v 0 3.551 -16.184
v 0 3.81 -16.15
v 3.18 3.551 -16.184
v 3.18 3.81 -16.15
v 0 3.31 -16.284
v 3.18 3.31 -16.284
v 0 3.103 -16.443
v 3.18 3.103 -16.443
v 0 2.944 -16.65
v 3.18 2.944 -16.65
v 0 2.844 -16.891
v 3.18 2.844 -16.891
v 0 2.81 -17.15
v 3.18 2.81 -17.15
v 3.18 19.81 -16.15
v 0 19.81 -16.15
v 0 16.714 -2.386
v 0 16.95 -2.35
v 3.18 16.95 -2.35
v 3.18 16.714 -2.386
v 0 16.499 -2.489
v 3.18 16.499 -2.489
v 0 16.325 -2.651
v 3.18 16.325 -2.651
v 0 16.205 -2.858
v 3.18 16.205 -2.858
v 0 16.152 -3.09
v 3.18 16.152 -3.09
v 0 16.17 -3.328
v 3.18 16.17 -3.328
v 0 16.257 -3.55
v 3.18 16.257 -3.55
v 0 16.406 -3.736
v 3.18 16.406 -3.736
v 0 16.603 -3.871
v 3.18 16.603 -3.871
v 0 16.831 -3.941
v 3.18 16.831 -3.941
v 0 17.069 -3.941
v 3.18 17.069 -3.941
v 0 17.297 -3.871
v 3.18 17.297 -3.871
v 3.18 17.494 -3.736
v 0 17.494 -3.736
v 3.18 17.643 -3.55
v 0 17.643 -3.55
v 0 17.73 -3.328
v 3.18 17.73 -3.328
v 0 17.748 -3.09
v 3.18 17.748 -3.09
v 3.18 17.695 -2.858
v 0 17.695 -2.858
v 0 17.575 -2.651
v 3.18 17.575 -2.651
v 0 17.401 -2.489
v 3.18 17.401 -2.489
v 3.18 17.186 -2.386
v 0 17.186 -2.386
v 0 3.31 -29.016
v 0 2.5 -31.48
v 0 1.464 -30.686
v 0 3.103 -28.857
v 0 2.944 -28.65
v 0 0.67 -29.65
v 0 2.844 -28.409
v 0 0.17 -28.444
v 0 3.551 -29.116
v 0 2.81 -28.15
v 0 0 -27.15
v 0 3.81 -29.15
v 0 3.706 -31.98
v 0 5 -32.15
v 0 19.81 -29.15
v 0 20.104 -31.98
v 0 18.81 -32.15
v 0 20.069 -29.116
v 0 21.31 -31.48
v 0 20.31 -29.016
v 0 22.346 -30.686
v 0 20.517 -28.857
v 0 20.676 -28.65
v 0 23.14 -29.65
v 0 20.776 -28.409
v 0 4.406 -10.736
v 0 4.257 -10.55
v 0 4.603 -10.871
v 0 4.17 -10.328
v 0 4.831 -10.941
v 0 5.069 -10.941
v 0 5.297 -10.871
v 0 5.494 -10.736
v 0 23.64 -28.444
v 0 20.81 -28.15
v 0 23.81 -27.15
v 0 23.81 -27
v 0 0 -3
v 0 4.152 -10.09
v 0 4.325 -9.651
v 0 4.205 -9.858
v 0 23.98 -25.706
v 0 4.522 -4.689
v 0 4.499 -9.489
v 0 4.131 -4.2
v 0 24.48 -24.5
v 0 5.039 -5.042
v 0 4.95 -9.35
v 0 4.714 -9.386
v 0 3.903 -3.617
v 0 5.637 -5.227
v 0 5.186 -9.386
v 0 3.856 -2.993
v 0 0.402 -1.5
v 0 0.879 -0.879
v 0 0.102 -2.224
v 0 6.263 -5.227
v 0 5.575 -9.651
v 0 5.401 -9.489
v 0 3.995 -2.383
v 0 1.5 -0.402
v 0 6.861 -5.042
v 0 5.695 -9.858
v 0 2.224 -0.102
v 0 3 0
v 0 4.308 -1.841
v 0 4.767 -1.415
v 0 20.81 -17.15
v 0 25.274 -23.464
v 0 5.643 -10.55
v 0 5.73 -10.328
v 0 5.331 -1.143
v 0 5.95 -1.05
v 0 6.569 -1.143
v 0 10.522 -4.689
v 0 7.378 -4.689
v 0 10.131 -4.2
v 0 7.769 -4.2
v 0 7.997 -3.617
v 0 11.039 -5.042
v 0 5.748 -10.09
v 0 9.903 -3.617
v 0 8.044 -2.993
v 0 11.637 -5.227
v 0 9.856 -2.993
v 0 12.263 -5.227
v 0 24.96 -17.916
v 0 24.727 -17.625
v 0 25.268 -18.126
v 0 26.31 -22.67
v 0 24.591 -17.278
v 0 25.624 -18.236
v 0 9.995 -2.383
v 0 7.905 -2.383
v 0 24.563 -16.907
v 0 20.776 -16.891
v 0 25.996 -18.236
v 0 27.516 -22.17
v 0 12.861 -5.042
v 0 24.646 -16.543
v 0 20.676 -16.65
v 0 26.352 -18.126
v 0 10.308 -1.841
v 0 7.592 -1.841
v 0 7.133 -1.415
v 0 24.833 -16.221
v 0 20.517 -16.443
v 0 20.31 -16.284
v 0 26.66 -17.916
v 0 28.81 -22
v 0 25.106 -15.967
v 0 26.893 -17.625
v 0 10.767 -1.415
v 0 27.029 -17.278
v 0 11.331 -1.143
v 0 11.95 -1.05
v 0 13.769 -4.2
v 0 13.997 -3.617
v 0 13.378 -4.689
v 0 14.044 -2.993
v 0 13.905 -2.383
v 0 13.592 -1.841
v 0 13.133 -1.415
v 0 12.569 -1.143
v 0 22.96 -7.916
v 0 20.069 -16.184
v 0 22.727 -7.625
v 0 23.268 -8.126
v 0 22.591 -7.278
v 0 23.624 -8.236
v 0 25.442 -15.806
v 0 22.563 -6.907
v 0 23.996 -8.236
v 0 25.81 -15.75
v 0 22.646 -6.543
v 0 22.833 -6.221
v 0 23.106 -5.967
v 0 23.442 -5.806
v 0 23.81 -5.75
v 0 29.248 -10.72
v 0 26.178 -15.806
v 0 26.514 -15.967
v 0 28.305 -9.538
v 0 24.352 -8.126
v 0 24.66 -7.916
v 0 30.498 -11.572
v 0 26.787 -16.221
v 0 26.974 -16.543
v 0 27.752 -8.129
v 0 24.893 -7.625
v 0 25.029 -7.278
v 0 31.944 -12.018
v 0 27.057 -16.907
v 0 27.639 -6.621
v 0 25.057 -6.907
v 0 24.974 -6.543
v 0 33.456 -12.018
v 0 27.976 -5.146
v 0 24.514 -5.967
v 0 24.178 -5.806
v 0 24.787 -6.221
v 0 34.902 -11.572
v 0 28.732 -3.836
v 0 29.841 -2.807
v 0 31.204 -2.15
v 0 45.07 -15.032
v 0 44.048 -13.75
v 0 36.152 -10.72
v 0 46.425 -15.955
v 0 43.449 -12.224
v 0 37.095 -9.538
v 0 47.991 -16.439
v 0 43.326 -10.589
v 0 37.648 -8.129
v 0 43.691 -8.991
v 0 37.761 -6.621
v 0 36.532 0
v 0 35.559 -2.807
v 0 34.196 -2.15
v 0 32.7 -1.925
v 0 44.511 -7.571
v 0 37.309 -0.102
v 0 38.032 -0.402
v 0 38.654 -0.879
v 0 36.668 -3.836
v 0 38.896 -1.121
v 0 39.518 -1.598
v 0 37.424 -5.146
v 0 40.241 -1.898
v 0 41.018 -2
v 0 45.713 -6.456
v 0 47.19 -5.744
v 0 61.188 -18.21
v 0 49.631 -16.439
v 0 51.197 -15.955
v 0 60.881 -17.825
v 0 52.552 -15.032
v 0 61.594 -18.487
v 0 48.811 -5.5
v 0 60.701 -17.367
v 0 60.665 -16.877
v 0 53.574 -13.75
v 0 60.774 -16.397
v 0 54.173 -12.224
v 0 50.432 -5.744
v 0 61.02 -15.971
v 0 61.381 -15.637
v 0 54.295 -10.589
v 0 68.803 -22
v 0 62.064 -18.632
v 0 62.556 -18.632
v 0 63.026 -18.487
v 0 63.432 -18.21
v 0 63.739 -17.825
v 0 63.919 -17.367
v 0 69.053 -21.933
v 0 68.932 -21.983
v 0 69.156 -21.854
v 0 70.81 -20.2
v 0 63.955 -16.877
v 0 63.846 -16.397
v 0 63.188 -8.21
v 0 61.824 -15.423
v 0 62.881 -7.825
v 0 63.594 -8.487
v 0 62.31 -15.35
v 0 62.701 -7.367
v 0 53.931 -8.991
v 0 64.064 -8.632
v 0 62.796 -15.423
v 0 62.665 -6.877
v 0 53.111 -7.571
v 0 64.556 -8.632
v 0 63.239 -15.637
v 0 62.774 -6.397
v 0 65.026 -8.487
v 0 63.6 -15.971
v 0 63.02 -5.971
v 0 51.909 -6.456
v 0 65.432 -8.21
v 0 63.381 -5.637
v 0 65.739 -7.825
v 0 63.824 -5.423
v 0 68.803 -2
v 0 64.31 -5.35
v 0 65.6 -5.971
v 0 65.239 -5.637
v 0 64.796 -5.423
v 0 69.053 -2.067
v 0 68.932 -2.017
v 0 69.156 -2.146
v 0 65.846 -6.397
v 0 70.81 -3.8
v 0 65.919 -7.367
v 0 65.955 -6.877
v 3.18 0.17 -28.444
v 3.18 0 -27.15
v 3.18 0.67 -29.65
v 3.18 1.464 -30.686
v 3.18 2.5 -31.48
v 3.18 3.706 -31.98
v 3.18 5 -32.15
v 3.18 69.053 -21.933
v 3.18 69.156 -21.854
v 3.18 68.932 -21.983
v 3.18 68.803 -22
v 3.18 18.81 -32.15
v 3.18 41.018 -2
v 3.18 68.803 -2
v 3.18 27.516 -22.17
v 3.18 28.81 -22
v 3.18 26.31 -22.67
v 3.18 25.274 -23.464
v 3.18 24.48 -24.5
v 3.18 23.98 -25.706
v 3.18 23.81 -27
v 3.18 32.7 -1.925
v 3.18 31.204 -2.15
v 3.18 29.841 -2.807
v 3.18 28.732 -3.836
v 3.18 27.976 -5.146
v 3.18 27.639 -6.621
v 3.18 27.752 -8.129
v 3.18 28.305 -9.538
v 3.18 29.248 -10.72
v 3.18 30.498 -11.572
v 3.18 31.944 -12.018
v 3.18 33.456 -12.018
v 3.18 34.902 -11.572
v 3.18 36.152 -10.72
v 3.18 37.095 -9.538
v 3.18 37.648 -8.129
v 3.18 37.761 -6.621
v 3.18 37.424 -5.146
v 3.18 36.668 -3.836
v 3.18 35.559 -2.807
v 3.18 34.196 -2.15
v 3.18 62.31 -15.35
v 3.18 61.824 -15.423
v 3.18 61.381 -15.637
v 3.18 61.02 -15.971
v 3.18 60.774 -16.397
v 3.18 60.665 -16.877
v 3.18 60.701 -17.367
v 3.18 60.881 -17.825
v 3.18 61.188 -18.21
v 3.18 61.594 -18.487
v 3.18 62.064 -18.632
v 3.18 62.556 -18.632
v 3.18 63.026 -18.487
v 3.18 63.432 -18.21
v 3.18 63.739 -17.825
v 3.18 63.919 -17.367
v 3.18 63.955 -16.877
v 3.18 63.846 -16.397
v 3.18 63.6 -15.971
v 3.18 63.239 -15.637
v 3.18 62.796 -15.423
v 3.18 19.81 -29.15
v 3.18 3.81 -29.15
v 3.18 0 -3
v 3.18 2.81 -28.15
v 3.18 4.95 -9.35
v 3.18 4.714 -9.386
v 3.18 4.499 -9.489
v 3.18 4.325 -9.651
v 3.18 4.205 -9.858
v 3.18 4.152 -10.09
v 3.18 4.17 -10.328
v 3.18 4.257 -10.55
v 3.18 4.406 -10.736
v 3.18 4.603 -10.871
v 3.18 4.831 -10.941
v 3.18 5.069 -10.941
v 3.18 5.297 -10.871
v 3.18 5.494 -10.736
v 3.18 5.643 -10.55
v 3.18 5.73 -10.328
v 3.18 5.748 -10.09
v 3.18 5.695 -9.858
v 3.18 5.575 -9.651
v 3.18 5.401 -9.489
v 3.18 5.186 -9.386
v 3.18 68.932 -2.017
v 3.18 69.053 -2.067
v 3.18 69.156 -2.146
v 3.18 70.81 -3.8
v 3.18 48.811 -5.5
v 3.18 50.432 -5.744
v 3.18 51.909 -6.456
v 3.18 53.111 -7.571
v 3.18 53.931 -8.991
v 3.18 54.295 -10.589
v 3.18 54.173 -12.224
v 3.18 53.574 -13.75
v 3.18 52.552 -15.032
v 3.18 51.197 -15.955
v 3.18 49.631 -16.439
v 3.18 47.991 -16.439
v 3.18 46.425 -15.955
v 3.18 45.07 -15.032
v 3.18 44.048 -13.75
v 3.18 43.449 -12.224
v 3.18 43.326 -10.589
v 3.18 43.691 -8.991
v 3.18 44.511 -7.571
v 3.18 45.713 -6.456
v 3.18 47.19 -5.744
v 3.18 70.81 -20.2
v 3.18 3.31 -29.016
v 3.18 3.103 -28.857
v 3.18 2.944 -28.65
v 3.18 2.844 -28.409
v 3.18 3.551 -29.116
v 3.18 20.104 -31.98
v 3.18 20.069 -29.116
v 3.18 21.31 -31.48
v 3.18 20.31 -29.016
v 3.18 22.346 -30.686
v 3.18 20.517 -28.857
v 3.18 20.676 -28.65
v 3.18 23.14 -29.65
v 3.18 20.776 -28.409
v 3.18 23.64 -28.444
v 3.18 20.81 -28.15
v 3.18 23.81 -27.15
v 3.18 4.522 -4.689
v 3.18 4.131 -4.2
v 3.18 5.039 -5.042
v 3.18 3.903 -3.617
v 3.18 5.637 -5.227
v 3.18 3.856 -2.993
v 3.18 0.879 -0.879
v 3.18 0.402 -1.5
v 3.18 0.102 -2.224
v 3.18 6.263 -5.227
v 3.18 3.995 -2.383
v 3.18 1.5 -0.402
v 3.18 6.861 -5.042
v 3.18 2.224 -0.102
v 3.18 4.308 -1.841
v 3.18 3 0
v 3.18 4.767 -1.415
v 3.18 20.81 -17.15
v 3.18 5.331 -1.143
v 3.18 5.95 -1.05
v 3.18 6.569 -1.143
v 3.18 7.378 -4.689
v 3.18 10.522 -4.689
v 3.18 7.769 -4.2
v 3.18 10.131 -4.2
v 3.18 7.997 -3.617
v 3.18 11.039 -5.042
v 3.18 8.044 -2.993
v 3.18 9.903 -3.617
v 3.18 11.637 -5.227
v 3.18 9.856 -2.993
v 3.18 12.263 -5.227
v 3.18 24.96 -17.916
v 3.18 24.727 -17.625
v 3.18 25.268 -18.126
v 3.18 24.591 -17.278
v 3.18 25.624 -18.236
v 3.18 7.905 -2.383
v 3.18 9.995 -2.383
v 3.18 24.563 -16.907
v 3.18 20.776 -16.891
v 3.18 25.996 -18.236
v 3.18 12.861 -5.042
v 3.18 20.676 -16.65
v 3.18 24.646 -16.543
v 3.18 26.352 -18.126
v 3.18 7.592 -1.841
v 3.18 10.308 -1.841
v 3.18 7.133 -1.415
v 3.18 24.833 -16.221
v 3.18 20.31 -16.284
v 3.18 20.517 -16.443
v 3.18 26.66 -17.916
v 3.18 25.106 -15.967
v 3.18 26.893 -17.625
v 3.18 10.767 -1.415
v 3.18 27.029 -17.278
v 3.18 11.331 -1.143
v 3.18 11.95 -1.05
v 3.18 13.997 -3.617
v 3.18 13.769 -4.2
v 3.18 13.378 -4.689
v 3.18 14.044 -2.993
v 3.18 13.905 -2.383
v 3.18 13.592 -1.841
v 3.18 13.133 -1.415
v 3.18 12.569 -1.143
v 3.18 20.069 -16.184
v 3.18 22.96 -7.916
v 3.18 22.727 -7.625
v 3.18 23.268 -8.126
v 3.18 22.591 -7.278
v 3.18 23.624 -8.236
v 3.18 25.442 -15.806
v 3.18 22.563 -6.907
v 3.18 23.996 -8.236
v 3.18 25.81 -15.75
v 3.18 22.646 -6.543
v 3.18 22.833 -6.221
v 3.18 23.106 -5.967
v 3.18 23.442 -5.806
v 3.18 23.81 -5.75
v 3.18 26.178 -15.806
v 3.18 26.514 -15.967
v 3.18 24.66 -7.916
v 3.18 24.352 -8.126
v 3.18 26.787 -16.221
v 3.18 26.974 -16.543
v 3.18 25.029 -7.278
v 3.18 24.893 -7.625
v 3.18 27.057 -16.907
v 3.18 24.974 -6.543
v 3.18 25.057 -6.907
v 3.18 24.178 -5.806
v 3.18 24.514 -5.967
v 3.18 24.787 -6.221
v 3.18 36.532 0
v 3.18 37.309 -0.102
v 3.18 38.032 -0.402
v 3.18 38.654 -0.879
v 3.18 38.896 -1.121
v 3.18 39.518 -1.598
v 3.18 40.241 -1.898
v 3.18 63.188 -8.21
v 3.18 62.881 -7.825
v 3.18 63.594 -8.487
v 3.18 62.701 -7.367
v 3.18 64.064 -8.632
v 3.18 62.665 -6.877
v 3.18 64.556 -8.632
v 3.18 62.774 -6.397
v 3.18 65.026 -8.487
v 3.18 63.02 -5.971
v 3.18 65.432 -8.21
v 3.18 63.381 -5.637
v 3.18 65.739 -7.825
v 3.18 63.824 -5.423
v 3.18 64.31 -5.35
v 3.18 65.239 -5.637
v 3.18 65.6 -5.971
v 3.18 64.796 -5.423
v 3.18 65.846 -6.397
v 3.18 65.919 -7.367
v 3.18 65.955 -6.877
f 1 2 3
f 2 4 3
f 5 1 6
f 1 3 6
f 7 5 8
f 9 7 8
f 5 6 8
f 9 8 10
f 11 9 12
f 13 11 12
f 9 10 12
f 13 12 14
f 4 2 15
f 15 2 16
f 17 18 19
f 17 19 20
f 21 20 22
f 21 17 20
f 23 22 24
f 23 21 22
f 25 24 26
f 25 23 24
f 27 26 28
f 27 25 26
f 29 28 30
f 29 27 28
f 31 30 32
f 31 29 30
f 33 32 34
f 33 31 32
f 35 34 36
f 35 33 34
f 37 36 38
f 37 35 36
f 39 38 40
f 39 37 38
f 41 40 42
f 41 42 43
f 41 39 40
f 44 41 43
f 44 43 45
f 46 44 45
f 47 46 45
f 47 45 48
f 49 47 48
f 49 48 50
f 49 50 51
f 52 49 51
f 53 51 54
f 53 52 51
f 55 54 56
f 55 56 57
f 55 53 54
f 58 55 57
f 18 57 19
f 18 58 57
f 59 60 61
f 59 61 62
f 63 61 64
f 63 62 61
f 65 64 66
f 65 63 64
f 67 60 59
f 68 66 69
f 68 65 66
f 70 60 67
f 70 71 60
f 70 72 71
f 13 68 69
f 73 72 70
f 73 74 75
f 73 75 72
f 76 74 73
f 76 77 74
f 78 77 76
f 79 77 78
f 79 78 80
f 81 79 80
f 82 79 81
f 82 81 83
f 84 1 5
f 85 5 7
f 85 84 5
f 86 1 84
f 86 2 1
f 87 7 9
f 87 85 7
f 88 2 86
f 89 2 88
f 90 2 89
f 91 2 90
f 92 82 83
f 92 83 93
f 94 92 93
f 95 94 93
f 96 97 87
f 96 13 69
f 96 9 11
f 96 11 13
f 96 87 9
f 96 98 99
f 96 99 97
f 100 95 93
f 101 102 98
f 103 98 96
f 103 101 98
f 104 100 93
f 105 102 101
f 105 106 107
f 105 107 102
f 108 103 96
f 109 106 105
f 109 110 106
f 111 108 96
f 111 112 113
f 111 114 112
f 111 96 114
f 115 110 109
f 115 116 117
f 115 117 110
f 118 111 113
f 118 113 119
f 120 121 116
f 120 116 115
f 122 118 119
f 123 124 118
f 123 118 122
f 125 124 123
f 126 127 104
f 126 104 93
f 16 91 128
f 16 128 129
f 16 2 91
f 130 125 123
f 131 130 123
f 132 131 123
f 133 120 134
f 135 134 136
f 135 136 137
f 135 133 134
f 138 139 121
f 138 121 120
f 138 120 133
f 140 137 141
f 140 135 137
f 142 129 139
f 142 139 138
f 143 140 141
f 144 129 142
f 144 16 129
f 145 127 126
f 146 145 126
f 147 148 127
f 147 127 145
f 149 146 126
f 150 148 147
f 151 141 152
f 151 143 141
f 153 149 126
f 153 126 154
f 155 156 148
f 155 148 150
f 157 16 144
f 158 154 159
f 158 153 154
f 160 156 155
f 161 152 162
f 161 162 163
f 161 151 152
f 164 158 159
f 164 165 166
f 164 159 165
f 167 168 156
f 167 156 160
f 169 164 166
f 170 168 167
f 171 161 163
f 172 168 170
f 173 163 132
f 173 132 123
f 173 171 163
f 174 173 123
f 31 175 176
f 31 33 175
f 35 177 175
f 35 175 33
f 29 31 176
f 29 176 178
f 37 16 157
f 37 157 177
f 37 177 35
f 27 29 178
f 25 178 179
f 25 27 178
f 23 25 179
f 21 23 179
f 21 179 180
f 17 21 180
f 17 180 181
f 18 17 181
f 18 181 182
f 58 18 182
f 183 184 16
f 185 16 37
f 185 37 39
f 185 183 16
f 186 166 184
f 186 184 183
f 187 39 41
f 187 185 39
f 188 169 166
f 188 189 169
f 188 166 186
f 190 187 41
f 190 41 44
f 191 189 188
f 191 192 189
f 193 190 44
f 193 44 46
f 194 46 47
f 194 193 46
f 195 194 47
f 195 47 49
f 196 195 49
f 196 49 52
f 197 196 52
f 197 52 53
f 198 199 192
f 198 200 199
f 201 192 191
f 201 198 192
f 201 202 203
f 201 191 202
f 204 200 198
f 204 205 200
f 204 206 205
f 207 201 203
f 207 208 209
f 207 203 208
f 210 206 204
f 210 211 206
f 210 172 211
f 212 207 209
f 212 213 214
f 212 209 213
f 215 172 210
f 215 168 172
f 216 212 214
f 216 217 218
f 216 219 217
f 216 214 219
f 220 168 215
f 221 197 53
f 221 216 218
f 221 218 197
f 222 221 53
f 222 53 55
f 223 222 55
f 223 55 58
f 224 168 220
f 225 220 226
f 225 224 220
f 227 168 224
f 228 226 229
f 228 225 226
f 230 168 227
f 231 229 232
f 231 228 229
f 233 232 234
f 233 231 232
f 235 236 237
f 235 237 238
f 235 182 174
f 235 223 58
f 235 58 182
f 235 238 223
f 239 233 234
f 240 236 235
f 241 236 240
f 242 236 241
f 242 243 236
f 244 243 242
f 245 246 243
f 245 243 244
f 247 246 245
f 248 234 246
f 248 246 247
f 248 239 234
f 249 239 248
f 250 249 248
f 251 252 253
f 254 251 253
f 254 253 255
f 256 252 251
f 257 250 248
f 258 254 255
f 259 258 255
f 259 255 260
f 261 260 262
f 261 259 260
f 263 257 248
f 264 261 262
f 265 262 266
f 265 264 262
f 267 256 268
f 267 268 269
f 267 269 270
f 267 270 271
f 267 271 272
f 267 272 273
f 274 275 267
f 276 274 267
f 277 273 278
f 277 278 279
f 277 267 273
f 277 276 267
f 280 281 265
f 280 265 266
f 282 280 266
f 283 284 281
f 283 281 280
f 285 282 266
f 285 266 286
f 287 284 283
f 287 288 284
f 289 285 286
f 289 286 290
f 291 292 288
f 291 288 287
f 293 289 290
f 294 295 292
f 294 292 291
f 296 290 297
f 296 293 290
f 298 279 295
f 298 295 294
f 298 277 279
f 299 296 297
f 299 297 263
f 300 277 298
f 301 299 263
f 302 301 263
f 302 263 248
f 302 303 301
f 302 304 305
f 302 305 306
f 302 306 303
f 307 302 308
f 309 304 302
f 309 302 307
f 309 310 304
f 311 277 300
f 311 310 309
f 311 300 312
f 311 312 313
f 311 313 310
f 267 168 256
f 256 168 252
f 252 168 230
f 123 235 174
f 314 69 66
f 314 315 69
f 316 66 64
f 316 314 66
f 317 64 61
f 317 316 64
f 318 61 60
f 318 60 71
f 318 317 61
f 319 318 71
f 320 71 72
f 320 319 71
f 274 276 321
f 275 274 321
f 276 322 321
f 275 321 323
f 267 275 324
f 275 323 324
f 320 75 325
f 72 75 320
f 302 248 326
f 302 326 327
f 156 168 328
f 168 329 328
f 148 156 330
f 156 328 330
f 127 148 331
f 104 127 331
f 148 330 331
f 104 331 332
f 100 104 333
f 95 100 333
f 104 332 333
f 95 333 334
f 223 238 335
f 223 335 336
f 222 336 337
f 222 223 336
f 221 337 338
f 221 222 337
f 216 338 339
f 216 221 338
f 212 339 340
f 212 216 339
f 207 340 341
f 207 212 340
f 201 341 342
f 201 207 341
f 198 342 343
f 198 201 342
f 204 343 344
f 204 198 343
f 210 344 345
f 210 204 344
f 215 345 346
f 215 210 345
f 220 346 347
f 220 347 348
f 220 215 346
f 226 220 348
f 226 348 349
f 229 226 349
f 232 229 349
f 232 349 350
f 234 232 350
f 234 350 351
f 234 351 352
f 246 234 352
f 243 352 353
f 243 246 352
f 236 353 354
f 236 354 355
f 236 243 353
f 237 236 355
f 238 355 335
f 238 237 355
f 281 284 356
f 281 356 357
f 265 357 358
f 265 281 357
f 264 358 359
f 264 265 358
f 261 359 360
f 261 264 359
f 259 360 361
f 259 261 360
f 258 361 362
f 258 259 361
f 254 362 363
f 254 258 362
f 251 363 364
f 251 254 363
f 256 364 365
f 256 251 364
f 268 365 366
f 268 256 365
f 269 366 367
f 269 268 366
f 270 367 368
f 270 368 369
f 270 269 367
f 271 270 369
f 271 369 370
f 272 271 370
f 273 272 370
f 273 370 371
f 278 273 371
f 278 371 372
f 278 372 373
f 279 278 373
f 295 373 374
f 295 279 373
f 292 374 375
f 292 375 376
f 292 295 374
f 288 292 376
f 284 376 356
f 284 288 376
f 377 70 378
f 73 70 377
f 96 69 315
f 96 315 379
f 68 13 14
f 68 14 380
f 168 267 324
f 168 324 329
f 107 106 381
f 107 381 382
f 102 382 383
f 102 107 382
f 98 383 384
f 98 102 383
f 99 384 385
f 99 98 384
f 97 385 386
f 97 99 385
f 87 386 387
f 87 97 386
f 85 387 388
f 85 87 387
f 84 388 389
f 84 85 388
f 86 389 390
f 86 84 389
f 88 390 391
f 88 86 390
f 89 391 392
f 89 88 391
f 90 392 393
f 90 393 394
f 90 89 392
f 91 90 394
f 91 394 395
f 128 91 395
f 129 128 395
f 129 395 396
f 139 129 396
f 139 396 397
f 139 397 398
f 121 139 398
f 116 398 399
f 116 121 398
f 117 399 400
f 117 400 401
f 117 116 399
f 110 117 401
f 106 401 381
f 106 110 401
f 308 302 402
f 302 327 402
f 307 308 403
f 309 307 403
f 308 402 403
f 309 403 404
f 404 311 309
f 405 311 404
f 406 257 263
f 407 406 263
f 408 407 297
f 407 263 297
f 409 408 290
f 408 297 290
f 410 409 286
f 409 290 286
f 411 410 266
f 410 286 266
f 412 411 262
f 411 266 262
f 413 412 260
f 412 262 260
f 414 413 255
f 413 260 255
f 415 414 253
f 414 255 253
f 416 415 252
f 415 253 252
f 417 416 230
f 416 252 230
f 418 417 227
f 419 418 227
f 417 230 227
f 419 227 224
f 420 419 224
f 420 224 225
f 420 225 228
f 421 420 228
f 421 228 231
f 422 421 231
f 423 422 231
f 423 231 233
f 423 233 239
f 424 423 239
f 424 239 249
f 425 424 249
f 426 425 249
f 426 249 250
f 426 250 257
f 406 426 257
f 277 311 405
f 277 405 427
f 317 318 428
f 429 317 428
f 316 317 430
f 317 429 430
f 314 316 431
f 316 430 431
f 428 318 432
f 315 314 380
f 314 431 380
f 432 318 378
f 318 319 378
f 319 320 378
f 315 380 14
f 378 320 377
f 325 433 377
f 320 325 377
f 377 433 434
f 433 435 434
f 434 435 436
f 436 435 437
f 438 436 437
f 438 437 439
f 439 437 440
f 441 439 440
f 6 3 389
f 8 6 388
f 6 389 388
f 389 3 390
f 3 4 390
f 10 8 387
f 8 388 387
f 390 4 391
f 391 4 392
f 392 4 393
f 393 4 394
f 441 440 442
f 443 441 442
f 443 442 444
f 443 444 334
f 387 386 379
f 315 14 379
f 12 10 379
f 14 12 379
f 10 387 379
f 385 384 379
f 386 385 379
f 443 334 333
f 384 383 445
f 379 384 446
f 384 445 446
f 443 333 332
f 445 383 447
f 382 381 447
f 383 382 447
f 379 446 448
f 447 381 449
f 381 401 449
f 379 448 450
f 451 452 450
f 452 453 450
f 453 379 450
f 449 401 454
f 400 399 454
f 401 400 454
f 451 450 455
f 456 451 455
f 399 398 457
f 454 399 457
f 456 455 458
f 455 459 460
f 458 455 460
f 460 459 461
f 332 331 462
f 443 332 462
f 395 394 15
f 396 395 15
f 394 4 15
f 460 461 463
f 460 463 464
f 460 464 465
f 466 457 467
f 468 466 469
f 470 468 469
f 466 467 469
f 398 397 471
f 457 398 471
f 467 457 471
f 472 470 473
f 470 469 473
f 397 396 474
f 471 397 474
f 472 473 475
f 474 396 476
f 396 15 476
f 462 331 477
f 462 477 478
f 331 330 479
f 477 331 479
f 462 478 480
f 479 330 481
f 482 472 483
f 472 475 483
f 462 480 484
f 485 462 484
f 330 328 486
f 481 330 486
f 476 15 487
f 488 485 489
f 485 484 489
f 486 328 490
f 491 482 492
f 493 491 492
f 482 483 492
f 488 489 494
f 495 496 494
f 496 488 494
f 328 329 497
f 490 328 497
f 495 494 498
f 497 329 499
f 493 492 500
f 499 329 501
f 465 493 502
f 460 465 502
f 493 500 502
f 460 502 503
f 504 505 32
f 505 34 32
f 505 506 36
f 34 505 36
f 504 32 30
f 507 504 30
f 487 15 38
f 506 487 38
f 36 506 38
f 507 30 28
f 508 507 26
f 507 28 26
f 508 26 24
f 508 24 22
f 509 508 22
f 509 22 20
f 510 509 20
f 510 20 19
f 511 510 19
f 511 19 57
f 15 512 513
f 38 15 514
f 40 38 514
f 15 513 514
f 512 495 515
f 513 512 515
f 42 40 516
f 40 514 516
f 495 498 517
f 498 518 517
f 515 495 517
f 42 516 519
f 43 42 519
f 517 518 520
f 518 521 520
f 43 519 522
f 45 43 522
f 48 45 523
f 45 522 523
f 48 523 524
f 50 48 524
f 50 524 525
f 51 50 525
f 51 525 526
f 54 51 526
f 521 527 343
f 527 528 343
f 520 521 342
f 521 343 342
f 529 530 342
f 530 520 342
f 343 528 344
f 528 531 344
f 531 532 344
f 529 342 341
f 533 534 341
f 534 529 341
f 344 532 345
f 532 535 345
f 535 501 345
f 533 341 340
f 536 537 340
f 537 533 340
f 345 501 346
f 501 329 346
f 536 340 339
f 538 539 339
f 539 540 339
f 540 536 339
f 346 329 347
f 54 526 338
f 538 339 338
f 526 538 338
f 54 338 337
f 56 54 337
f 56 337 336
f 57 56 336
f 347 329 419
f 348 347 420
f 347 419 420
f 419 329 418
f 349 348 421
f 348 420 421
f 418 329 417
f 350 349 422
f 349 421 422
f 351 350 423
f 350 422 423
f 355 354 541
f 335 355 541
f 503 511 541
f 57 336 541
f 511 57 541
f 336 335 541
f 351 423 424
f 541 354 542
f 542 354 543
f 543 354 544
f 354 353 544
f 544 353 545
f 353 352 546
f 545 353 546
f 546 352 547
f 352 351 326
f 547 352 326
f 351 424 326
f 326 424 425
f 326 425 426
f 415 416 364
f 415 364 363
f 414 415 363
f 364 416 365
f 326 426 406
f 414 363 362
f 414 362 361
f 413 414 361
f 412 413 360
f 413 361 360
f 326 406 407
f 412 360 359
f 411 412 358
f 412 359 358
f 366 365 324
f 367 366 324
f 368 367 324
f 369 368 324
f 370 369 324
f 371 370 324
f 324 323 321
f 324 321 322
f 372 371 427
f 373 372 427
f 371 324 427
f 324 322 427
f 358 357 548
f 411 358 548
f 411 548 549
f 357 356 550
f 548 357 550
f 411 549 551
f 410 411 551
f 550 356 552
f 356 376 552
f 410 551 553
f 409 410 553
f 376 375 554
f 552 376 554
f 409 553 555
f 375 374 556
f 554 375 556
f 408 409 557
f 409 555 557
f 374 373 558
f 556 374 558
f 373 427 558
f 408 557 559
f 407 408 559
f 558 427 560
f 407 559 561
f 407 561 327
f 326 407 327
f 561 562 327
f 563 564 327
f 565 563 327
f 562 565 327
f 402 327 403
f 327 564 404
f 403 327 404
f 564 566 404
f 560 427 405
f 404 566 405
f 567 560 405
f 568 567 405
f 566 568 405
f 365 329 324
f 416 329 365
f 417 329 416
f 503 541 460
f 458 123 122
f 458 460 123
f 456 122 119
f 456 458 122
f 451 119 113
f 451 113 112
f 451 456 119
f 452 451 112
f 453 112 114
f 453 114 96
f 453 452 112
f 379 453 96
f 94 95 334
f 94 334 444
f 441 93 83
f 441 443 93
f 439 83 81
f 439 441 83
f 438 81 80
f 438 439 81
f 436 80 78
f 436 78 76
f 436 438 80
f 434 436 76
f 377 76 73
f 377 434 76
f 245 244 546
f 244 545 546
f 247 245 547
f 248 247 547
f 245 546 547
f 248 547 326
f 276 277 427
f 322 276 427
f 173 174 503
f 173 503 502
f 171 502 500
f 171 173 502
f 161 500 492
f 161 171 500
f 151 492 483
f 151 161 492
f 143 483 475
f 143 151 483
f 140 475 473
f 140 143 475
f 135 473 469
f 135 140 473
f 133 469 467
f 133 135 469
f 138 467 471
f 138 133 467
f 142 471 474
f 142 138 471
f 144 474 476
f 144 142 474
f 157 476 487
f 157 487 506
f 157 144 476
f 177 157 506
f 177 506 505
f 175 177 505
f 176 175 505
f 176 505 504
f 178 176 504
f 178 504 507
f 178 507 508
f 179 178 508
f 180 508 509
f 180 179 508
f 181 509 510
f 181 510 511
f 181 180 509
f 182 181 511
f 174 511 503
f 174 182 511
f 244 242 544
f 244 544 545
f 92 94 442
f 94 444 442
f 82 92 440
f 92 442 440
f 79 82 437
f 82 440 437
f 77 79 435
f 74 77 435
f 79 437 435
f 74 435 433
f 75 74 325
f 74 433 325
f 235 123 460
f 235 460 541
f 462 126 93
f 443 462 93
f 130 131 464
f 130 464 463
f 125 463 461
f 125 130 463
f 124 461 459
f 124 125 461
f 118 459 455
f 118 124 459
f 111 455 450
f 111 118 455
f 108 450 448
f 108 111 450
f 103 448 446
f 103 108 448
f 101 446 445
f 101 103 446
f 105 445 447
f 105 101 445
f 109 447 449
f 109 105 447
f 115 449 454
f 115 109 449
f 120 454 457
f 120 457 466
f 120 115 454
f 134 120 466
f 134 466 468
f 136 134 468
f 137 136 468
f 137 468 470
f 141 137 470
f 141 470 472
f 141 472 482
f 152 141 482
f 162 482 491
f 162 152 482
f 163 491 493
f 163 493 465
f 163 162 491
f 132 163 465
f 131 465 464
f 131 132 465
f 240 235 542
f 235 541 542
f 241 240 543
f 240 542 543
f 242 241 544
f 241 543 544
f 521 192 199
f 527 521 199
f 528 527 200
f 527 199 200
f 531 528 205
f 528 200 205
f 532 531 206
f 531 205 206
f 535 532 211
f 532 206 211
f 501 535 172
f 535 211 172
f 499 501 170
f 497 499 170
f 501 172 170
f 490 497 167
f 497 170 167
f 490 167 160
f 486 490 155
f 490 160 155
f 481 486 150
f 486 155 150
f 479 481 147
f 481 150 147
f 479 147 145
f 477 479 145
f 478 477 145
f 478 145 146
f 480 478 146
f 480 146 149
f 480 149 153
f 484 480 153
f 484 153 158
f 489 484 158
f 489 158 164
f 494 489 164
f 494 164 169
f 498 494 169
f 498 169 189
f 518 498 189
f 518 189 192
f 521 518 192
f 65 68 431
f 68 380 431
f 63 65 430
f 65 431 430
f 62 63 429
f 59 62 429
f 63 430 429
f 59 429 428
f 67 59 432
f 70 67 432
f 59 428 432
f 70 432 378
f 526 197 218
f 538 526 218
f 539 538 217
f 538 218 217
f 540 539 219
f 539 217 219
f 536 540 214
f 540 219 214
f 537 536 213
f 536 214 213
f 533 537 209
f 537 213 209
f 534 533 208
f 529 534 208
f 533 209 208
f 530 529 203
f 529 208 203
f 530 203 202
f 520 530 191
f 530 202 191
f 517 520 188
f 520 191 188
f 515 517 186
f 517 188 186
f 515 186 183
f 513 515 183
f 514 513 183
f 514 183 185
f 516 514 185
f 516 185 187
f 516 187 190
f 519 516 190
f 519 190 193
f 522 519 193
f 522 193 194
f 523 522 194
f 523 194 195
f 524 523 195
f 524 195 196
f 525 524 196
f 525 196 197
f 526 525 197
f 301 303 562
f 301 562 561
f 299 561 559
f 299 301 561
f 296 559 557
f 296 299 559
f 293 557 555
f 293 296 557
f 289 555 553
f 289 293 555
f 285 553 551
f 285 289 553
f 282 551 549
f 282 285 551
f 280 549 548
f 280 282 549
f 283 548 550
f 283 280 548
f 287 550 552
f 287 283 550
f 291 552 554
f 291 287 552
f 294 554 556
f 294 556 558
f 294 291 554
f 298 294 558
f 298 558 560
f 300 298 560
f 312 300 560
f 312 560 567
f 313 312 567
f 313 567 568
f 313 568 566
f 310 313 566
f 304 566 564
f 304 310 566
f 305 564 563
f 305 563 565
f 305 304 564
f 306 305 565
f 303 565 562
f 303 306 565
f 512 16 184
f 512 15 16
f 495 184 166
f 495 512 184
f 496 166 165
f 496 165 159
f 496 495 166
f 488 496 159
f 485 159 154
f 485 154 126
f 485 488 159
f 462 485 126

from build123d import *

# Parameters (mm, degrees)
SKETCH1_R             = 5.075
SKETCH1_R_2           = 1.65
SKETCH1_R_3           = 2.1
SKETCH1_R_4           = 0.8
SKETCH1_W             = 13
SKETCH1_H             = 18
BOSS_EXTRUDE1_DEPTH   = 3.18
SKETCH3_R             = 5.5
CUT_EXTRUDE4_DEPTH    = 78.831812262
FILLET2_R             = 3
CHAMFER2_SIZE         = 1.8
FILLET4_R             = 0.5
M2_TAPPED_HOLE1_D     = 1.6
FILLET9_R             = 1
FILLET11_R            = 5
M3X0_5_TAPPED_HOLE1_D = 2.5


with BuildPart() as part:
    # Sketch1 → Boss-Extrude1 (new body)
    with BuildSketch(Plane(origin=(0, 0, 0), x_dir=(0, 0, -1), z_dir=(1, 0, 0))):
        Polygon((0, 0), (0, 37.775), (2, 39.775), (2, 70.81), (22, 70.81), (22, 23.81), (32.15, 23.81), (32.15, 0), align=None)
        with Locations(Location((7, 32.7, 0), (0, 0, 180))):
            Circle(SKETCH1_R, mode=Mode.SUBTRACT)
        with Locations(Location((7, 64.31, 0), (0, 0, 180))):
            Circle(SKETCH1_R_2, mode=Mode.SUBTRACT)
        with Locations(Location((17, 62.31, 0), (0, 0, 180))):
            Circle(SKETCH1_R_2, mode=Mode.SUBTRACT)
        with Locations(Location((3.15, 5.95, 0), (0, 0, 180))):
            Circle(SKETCH1_R_3, mode=Mode.SUBTRACT)
        with Locations(Location((3.15, 11.95, 0), (0, 0, 180))):
            Circle(SKETCH1_R_3, mode=Mode.SUBTRACT)
        with Locations(Location((10.15, 4.95, 0), (0, 0, 180))):
            Circle(SKETCH1_R_4, mode=Mode.SUBTRACT)
        with Locations(Location((3.15, 16.95, 0), (0, 0, 180))):
            Circle(SKETCH1_R_4, mode=Mode.SUBTRACT)
        with Locations((22.65, 11.81)):
            Rectangle(SKETCH1_W, SKETCH1_H, mode=Mode.SUBTRACT)
    extrude(amount=BOSS_EXTRUDE1_DEPTH)

    # Sketch3 → Cut-Extrude4 (cut, through all)
    with BuildSketch(Plane.ZY):
        with Locations((-11, 48.810865899)):
            Circle(SKETCH3_R)
    extrude(amount=-CUT_EXTRUDE4_DEPTH, mode=Mode.SUBTRACT)

    # Fillet2
    fillet2_edges = [part.edges().sort_by_distance(p)[0] for p in [
        (1.59, 0, 0),
        (1.59, 37.775, 0),
        (1.59, 39.775, -2),
    ]]
    fillet(fillet2_edges, radius=FILLET2_R)

    # Chamfer2
    chamfer2_edges = [part.edges().sort_by_distance(p)[0] for p in [
        (1.59, 70.81, -2),
        (1.59, 70.81, -22),
    ]]
    chamfer(chamfer2_edges, length=CHAMFER2_SIZE)

    # Fillet4
    fillet4_edges = [part.edges().sort_by_distance(p)[0] for p in [
        (1.59, 69.01, -22),
        (1.59, 69.01, -2),
    ]]
    fillet(fillet4_edges, radius=FILLET4_R)

    # M2 Tapped Hole1 (through all)
    with Locations(Plane(origin=(0, 16.95, -3.15), x_dir=(0, 0, -1), z_dir=(-1, 0, 0))):
        with Locations((0, 0), (7, 12)):
            Hole(M2_TAPPED_HOLE1_D / 2)

    # Fillet9
    fillet9_edges = [part.edges().sort_by_distance(p)[0] for p in [
        (1.59, 20.81, -16.15),
        (1.59, 2.81, -16.15),
        (1.59, 2.81, -29.15),
        (1.59, 20.81, -29.15),
    ]]
    fillet(fillet9_edges, radius=FILLET9_R)

    # Fillet11
    fillet11_edges = [part.edges().sort_by_distance(p)[0] for p in [
        (1.59, 23.81, -32.15),
        (1.59, 0, -32.15),
        (1.59, 23.81, -22),
    ]]
    fillet(fillet11_edges, radius=FILLET11_R)

    # M3x0.5 Tapped Hole1 (through all)
    with Locations(Plane(origin=(3.18, 0, 0), x_dir=(0, 0, -1), z_dir=(1, 0, 0))):
        with Locations((7, 23.81), (17, 25.81)):
            Hole(M3X0_5_TAPPED_HOLE1_D / 2)


solid = part.part
